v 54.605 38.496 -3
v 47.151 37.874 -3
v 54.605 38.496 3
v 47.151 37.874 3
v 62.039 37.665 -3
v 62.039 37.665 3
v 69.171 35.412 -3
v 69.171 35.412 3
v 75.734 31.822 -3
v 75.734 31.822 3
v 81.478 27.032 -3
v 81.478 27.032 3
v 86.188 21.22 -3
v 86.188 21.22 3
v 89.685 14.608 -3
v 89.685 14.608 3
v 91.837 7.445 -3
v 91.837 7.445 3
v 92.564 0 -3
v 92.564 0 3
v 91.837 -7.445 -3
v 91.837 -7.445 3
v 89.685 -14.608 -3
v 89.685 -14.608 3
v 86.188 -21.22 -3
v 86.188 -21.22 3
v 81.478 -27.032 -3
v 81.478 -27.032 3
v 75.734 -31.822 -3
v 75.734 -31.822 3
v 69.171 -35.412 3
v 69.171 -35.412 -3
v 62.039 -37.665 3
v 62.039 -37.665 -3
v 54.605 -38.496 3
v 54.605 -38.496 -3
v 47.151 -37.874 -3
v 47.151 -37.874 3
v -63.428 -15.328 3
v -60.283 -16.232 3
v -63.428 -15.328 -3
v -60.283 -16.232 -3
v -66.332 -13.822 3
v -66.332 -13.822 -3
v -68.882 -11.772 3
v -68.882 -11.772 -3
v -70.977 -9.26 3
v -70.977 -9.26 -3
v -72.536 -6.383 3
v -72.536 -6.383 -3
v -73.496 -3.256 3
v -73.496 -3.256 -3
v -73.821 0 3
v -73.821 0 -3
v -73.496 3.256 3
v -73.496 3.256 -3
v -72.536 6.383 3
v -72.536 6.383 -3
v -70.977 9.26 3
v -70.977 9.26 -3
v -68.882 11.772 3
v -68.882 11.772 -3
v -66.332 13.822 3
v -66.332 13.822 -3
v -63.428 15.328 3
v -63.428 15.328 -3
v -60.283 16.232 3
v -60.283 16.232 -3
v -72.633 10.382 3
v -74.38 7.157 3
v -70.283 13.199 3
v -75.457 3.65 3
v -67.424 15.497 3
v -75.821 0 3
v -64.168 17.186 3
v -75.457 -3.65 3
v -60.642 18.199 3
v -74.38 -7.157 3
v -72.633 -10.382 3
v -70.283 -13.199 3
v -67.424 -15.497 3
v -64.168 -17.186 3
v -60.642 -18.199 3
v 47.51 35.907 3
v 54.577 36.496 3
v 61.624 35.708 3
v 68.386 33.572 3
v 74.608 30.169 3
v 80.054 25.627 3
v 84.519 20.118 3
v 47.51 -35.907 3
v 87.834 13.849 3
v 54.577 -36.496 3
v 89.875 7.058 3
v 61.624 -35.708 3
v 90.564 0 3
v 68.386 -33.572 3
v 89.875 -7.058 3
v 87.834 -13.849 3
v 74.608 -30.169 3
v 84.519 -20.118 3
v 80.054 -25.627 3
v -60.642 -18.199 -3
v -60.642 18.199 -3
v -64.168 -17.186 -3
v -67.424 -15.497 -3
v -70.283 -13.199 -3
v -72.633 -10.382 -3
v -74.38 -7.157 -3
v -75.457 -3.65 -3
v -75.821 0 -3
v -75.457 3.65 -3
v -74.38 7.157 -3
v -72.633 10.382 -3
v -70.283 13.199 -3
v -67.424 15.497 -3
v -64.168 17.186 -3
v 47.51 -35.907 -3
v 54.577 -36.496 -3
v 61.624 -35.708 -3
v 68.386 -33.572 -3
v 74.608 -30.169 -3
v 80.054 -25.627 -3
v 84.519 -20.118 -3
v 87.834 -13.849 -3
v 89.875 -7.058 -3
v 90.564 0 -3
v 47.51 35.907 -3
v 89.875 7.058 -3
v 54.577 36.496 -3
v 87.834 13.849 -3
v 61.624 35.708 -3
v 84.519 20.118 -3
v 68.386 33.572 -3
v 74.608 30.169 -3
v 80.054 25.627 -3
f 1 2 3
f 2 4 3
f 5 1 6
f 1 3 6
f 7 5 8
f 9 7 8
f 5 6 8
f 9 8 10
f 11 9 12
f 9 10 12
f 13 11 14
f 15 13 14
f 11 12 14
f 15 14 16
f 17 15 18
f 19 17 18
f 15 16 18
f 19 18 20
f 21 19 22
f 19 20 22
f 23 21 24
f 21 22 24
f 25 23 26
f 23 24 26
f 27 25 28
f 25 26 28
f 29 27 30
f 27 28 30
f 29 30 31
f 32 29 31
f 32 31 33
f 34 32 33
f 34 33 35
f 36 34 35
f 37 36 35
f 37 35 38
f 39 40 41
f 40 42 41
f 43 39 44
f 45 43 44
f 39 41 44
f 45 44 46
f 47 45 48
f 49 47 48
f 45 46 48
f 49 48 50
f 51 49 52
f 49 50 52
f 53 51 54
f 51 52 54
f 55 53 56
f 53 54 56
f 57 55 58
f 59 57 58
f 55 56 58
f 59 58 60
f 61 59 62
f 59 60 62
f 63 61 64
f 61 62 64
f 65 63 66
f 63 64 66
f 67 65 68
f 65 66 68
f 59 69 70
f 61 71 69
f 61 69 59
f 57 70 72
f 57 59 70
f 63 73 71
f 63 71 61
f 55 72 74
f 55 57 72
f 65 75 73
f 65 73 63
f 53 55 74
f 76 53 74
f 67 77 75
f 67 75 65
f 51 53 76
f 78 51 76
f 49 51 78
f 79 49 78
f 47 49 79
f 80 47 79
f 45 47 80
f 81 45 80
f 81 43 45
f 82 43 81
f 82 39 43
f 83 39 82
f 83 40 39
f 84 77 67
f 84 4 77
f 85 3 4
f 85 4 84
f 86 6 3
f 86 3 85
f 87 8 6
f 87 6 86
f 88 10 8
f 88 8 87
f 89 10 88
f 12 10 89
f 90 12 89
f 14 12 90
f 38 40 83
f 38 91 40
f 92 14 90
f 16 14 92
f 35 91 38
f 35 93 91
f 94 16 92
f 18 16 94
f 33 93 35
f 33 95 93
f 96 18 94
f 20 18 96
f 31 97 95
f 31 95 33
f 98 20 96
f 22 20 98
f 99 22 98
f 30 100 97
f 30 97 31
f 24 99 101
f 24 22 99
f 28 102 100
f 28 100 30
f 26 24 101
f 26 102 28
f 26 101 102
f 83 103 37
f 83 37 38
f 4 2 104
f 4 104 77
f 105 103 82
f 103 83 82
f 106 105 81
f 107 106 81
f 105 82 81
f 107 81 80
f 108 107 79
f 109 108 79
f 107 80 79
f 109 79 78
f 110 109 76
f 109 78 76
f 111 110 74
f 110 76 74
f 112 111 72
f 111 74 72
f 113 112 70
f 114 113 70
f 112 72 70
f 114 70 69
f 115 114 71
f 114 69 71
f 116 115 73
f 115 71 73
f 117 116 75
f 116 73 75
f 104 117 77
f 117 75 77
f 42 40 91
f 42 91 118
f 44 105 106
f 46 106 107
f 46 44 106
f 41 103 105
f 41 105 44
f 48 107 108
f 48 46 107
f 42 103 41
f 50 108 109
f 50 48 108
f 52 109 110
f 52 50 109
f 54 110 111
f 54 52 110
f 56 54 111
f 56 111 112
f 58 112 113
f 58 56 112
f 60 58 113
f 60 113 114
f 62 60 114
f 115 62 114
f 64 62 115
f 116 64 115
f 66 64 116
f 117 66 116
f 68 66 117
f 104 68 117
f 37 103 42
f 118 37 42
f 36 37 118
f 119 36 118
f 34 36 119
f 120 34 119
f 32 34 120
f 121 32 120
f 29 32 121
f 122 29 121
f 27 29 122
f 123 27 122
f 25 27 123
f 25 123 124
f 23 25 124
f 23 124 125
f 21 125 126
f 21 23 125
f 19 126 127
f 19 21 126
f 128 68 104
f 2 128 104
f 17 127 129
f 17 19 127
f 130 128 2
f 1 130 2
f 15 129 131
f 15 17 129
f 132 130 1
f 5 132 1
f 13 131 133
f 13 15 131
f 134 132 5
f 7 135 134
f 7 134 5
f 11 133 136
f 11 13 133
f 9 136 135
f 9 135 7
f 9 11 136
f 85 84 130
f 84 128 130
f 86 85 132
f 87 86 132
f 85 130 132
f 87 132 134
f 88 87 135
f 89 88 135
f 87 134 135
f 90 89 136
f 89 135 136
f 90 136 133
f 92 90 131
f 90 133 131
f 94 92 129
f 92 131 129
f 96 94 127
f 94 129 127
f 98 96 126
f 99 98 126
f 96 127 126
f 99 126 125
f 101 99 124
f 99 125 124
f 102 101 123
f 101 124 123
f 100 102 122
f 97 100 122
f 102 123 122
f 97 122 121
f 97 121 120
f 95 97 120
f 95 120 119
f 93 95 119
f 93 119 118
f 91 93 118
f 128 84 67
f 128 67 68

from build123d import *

# Parameters (mm, degrees)
ESBO_O2_W = 6
ESBO_O2_H = 2


with BuildPart() as part:
    # Varredura1: sweep along a path in Esboço1
    with BuildLine(Plane.XY) as varredura1_path:
        Line((-60.462858141, 17.215577733), (47.330289745, 36.890523713))
        ThreePointArc((47.330289745, 36.890523713), (91.563733155, 0), (47.330289745, -36.890523713))
        Line((47.330289745, -36.890523713), (-60.462858141, -17.215577733))
        ThreePointArc((-60.462858141, -17.215577733), (-74.82058455, 0), (-60.462858141, 17.215577733))
    # Esboço2 → Varredura1 (sweep)
    with BuildSketch(Plane(origin=(-60.462858141, 17.215577733, 0), x_dir=(0, 0, -1), z_dir=(0.9837472990234445, 0.17955849092726803, 0))):
        Rectangle(ESBO_O2_W, ESBO_O2_H)
    sweep(path=varredura1_path.line)


solid = part.part
